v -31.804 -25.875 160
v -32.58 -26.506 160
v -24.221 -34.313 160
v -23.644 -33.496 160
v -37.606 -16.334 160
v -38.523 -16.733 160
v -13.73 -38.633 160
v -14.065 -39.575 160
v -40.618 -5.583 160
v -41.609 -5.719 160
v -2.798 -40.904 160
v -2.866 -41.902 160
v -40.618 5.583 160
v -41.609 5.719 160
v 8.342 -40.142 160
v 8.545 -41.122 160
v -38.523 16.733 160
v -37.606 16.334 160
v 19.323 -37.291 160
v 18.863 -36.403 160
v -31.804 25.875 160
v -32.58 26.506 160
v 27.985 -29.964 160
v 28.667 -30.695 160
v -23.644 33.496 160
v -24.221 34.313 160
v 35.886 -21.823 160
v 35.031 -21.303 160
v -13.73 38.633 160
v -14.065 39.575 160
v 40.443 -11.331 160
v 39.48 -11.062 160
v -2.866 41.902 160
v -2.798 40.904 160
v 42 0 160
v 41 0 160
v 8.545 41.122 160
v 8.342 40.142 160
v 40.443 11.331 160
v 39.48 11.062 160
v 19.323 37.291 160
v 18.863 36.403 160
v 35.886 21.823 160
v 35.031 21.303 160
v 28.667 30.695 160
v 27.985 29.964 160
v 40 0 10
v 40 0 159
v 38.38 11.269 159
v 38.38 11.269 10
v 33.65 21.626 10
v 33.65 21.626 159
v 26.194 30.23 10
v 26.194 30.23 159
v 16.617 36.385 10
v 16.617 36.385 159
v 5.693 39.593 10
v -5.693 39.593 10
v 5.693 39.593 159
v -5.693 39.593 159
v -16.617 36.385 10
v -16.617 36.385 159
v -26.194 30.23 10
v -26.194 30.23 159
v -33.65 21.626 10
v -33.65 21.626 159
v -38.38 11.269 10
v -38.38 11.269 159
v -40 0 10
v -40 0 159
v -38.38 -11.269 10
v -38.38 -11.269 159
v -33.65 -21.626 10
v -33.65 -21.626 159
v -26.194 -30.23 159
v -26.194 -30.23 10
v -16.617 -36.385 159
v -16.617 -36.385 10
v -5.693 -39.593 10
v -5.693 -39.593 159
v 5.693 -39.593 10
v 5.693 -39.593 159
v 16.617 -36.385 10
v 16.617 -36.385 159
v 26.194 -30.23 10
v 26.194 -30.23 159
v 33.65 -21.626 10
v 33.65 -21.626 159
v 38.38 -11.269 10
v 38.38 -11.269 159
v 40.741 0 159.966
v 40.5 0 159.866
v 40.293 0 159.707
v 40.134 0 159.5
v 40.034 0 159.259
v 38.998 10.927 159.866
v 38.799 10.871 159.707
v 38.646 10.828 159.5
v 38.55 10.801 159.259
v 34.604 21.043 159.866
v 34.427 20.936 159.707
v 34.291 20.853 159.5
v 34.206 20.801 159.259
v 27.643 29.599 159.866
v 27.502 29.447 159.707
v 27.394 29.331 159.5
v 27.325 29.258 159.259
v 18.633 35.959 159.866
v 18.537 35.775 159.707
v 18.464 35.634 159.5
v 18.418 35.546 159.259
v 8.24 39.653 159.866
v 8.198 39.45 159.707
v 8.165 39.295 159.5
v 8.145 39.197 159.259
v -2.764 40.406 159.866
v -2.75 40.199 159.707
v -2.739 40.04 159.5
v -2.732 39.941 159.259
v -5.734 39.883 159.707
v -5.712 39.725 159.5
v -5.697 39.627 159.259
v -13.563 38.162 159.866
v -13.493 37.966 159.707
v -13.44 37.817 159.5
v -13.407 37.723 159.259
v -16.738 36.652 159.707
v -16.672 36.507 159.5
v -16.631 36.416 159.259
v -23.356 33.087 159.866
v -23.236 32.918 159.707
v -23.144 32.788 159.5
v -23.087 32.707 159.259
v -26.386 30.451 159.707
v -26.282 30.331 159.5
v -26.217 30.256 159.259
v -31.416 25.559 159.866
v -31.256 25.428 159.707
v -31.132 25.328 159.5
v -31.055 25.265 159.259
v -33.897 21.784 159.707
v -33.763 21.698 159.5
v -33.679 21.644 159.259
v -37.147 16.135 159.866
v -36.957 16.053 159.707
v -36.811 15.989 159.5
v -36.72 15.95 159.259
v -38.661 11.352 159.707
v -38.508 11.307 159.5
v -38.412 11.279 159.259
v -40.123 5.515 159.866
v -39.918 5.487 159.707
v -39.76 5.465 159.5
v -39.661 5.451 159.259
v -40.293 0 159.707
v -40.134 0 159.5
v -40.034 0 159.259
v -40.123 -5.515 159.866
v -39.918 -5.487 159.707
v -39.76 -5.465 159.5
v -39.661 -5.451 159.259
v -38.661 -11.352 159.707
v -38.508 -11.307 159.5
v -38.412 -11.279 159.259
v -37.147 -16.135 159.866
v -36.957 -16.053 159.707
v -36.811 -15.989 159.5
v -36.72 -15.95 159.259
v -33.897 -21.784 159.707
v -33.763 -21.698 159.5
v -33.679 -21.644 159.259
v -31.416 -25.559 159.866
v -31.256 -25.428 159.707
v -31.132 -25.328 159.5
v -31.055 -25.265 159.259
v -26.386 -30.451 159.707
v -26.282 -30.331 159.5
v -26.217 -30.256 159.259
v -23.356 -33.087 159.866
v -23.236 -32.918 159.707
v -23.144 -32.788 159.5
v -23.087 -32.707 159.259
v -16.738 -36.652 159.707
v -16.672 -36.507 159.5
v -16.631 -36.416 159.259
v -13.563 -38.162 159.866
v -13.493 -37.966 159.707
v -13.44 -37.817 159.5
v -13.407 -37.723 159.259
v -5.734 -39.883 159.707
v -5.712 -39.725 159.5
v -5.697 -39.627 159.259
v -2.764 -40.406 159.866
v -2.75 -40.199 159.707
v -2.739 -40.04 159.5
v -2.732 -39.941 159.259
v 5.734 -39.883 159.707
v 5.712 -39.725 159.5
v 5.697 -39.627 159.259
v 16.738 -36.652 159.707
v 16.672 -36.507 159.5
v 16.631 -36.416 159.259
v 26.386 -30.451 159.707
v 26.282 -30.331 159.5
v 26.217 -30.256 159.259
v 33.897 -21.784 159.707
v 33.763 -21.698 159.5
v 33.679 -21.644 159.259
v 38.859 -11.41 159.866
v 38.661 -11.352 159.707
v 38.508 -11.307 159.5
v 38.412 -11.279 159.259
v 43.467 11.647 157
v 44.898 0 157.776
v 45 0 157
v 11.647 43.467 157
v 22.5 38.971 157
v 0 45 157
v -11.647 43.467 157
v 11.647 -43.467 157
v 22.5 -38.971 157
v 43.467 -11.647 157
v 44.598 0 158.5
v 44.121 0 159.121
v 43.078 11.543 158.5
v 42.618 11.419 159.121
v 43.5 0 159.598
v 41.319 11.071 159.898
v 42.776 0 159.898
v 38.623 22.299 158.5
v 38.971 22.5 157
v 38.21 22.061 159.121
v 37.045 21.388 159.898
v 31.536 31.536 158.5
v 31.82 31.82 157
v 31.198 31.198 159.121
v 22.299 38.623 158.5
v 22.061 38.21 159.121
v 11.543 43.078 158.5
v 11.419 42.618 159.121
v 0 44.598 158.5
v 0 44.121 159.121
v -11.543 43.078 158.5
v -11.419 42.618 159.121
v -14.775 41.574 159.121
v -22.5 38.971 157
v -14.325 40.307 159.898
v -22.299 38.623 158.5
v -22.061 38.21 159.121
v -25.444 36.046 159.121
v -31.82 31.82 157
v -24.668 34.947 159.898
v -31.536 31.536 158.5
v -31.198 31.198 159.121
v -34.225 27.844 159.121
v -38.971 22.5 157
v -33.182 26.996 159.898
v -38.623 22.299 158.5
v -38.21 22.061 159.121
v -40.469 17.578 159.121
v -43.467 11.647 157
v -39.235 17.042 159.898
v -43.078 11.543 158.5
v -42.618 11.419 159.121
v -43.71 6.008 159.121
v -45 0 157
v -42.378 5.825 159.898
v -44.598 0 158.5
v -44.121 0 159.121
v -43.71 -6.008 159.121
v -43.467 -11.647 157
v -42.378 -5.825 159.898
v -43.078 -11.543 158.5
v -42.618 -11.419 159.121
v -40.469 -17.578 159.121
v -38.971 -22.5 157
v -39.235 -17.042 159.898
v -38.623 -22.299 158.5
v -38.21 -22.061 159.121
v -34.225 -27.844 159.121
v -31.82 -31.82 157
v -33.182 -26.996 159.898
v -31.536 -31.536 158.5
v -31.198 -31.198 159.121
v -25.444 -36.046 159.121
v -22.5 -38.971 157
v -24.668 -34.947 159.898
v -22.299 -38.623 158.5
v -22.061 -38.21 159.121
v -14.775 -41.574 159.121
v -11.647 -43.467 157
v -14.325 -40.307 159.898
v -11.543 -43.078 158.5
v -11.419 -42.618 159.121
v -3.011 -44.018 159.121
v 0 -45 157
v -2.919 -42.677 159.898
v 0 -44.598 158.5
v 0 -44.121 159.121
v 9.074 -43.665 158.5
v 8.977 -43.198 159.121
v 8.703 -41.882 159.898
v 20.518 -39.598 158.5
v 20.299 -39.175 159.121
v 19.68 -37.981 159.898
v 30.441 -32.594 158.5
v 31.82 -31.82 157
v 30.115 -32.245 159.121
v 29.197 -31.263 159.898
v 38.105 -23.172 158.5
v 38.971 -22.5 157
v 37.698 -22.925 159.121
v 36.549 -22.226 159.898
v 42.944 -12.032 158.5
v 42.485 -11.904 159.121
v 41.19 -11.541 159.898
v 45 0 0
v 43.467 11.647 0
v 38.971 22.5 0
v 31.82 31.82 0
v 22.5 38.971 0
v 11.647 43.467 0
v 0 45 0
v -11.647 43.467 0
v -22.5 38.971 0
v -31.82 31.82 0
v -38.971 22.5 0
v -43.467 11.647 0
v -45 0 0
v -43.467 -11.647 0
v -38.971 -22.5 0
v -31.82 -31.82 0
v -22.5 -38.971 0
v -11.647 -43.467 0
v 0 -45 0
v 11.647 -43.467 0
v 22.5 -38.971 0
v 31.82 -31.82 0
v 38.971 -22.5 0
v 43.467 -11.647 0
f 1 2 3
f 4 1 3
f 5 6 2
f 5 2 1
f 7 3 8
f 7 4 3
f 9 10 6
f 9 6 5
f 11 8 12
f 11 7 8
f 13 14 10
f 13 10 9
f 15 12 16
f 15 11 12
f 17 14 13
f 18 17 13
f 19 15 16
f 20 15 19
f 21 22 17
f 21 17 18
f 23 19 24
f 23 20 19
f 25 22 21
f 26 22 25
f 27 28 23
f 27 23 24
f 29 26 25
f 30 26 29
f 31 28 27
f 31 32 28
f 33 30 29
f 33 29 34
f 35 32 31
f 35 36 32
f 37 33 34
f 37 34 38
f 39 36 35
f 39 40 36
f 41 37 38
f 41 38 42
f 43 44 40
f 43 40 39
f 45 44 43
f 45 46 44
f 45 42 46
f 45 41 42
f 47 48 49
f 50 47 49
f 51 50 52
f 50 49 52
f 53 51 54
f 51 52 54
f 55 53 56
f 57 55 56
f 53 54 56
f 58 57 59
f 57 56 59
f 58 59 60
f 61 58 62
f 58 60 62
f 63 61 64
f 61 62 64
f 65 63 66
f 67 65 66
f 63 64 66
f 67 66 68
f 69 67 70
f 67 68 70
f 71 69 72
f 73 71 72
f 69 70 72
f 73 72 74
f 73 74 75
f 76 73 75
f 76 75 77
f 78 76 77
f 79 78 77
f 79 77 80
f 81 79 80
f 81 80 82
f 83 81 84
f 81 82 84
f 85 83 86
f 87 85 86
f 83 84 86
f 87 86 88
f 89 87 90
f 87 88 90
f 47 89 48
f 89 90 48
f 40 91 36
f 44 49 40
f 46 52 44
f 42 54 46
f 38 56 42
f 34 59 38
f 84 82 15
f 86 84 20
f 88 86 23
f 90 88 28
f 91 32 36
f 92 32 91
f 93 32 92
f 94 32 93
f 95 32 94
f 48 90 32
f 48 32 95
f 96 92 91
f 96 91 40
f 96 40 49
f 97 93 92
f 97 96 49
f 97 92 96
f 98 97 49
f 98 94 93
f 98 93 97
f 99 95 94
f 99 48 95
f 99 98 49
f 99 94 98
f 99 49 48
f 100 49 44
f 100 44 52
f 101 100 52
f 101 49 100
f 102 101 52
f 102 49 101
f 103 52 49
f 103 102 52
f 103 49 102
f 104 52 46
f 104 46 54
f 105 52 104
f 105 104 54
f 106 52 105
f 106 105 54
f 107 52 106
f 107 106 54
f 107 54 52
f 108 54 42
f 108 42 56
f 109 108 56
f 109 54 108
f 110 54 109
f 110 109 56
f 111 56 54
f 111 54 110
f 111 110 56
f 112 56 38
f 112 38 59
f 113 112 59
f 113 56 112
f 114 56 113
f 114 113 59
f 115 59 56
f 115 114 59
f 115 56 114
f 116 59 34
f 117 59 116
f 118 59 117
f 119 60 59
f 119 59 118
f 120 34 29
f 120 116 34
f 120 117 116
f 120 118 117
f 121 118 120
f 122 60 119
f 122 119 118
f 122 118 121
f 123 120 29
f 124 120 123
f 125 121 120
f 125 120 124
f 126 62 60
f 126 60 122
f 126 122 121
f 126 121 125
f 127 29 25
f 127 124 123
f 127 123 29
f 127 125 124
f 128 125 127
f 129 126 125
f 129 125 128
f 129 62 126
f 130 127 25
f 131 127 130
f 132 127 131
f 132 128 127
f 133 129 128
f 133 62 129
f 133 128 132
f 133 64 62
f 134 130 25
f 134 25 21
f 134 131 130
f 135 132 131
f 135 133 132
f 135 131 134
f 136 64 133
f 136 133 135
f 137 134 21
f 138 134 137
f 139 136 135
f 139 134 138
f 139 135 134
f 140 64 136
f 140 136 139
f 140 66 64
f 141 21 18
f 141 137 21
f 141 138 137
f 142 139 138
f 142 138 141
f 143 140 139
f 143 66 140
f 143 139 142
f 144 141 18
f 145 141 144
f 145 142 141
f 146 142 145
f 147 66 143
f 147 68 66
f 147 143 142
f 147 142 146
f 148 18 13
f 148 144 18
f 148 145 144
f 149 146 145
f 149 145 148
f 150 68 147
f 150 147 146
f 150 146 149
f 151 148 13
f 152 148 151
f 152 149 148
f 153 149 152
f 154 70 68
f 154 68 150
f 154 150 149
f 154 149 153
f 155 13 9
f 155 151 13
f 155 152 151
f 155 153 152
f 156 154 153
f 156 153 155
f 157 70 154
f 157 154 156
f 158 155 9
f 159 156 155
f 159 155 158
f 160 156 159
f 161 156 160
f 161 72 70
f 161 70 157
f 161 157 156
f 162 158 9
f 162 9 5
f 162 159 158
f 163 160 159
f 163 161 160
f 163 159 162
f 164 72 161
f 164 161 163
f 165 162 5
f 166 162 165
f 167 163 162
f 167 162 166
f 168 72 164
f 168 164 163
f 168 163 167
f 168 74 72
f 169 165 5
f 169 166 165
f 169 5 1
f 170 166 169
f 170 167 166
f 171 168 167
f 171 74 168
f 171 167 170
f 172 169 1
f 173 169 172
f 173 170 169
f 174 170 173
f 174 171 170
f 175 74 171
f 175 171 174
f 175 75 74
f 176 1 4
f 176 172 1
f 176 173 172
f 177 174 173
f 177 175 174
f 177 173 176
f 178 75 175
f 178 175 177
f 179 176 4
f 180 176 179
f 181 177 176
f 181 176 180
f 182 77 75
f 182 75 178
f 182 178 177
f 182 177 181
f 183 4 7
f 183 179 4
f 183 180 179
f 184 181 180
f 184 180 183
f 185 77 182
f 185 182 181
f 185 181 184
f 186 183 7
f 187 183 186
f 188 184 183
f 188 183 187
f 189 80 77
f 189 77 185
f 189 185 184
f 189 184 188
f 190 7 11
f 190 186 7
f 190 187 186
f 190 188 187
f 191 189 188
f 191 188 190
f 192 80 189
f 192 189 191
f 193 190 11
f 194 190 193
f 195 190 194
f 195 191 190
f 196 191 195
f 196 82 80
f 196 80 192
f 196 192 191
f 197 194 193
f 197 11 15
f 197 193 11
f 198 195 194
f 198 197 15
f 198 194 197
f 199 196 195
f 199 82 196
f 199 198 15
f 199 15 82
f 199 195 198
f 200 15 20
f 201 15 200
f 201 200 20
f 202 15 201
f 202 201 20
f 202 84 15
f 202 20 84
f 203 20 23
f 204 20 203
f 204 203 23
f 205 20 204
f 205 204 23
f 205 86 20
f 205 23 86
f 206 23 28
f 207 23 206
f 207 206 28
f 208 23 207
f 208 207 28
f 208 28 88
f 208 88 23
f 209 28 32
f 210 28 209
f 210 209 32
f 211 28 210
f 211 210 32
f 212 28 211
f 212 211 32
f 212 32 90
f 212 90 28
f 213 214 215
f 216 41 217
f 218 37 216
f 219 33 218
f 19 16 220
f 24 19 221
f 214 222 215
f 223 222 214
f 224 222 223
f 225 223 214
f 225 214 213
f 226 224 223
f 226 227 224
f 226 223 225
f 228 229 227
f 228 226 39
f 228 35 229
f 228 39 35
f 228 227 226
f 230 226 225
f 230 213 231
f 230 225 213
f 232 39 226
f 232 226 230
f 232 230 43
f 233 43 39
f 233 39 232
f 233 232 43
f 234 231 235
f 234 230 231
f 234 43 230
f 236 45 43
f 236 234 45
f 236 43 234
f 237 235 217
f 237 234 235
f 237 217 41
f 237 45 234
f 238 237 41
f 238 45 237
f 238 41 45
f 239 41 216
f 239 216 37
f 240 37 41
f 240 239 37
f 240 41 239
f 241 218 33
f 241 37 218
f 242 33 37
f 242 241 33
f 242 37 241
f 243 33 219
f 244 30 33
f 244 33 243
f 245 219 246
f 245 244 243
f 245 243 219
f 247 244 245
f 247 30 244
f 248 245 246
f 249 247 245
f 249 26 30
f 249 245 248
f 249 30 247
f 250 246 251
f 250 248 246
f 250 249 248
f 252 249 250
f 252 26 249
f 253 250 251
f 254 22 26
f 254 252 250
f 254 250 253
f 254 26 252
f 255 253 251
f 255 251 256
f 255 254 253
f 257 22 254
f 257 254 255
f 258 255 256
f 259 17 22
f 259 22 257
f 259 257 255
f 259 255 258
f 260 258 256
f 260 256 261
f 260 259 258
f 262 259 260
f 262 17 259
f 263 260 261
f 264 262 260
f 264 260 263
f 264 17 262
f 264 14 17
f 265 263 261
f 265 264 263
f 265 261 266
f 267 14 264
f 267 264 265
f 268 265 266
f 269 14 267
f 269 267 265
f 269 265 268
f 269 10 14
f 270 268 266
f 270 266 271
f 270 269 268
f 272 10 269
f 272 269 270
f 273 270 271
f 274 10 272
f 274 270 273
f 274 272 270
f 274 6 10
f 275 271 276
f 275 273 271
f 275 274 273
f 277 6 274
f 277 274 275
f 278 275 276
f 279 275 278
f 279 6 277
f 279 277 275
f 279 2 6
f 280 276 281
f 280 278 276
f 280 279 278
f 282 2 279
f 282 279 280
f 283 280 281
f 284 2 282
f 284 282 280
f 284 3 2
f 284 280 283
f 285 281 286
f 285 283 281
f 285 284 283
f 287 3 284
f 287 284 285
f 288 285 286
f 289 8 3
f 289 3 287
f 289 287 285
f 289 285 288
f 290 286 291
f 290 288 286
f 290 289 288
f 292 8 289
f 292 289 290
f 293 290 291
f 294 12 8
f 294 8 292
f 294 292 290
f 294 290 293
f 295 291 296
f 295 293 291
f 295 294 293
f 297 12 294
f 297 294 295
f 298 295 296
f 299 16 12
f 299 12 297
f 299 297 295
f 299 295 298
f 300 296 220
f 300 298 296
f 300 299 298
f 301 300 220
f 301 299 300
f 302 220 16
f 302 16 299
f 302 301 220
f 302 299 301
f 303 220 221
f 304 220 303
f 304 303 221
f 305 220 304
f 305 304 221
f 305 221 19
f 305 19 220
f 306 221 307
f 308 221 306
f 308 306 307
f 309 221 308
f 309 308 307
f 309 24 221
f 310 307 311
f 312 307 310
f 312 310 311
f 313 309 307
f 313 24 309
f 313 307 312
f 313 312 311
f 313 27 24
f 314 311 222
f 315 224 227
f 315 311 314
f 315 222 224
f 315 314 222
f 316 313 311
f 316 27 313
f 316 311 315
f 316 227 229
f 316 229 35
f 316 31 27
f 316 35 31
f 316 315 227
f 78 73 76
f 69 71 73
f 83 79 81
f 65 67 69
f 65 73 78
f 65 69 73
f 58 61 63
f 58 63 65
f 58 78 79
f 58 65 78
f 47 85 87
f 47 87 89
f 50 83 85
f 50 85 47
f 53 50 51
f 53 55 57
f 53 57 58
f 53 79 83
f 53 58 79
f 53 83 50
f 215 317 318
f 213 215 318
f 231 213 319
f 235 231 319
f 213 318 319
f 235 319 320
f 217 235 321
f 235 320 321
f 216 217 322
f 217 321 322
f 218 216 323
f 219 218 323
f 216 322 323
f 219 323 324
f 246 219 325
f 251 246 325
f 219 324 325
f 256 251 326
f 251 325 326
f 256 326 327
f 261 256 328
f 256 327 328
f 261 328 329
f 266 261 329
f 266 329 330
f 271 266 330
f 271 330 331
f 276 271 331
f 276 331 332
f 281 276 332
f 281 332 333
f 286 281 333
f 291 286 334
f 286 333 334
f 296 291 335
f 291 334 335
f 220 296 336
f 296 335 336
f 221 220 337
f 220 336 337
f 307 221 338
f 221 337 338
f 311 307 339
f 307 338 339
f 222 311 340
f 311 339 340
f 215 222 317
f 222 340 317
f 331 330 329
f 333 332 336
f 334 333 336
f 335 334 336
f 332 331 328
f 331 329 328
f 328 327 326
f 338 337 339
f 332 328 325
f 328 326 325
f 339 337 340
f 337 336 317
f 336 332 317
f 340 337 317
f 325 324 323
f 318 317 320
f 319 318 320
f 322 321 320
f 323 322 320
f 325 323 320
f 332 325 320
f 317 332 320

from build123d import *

# Parameters (mm, degrees)
SKETCH_R     = 45
PAD_DEPTH    = 160
FILLET_R     = 3
SKETCH001_R  = 40
POCKET_DEPTH = 150
FILLET001_R  = 1


with BuildPart() as part:
    # Sketch → Pad (new body)
    with BuildSketch(Plane.XY):
        Circle(SKETCH_R)
    extrude(amount=PAD_DEPTH)

    # Fillet
    fillet_edges = [part.edges().sort_by_distance(p)[0] for p in [
        (-45, 0, 160),
    ]]
    fillet(fillet_edges, radius=FILLET_R)

    # Sketch001 (on Face4 of Fillet) → Pocket (cut)
    with BuildSketch(Plane.XY.offset(160)):
        Circle(SKETCH001_R)
    extrude(amount=-POCKET_DEPTH, mode=Mode.SUBTRACT)

    # Fillet001
    fillet001_edges = [part.edges().sort_by_distance(p)[0] for p in [
        (-40, 0, 160),
    ]]
    fillet(fillet001_edges, radius=FILLET001_R)


solid = part.part
